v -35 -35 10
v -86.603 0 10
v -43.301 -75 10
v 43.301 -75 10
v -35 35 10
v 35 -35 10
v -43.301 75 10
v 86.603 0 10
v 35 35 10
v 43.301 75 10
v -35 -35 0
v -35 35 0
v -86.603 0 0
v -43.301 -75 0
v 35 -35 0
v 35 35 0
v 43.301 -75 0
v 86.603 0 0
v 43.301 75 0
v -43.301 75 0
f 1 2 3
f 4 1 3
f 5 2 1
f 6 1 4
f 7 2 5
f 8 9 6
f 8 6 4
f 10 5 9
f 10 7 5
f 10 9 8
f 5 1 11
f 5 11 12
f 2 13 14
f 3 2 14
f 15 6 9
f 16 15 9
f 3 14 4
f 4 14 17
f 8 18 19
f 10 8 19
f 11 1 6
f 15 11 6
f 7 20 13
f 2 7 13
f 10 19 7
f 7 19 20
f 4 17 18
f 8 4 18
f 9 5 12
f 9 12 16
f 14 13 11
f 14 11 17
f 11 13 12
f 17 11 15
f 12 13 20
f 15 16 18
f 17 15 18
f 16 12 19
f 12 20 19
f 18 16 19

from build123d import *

# Parameters (mm, degrees)
CAP_DEPTH            = 10
SKETCH2_W            = 70
SKETCH2_H            = 70
BATTERY_ACCESS_DEPTH = 116


with BuildPart() as part:
    # Sketch1 → Cap (new body)
    with BuildSketch(Plane.XY):
        Polygon((86.602540378, 0), (43.301270189, 75), (-43.301270189, 75), (-86.602540378, 0), (-43.301270189, -75), (43.301270189, -75), align=None)
    extrude(amount=CAP_DEPTH)

    # Sketch2 → Battery Access (cut, through all)
    with BuildSketch(Plane.XY.offset(10)):
        Rectangle(SKETCH2_W, SKETCH2_H)
    extrude(amount=-BATTERY_ACCESS_DEPTH, mode=Mode.SUBTRACT)


solid = part.part
